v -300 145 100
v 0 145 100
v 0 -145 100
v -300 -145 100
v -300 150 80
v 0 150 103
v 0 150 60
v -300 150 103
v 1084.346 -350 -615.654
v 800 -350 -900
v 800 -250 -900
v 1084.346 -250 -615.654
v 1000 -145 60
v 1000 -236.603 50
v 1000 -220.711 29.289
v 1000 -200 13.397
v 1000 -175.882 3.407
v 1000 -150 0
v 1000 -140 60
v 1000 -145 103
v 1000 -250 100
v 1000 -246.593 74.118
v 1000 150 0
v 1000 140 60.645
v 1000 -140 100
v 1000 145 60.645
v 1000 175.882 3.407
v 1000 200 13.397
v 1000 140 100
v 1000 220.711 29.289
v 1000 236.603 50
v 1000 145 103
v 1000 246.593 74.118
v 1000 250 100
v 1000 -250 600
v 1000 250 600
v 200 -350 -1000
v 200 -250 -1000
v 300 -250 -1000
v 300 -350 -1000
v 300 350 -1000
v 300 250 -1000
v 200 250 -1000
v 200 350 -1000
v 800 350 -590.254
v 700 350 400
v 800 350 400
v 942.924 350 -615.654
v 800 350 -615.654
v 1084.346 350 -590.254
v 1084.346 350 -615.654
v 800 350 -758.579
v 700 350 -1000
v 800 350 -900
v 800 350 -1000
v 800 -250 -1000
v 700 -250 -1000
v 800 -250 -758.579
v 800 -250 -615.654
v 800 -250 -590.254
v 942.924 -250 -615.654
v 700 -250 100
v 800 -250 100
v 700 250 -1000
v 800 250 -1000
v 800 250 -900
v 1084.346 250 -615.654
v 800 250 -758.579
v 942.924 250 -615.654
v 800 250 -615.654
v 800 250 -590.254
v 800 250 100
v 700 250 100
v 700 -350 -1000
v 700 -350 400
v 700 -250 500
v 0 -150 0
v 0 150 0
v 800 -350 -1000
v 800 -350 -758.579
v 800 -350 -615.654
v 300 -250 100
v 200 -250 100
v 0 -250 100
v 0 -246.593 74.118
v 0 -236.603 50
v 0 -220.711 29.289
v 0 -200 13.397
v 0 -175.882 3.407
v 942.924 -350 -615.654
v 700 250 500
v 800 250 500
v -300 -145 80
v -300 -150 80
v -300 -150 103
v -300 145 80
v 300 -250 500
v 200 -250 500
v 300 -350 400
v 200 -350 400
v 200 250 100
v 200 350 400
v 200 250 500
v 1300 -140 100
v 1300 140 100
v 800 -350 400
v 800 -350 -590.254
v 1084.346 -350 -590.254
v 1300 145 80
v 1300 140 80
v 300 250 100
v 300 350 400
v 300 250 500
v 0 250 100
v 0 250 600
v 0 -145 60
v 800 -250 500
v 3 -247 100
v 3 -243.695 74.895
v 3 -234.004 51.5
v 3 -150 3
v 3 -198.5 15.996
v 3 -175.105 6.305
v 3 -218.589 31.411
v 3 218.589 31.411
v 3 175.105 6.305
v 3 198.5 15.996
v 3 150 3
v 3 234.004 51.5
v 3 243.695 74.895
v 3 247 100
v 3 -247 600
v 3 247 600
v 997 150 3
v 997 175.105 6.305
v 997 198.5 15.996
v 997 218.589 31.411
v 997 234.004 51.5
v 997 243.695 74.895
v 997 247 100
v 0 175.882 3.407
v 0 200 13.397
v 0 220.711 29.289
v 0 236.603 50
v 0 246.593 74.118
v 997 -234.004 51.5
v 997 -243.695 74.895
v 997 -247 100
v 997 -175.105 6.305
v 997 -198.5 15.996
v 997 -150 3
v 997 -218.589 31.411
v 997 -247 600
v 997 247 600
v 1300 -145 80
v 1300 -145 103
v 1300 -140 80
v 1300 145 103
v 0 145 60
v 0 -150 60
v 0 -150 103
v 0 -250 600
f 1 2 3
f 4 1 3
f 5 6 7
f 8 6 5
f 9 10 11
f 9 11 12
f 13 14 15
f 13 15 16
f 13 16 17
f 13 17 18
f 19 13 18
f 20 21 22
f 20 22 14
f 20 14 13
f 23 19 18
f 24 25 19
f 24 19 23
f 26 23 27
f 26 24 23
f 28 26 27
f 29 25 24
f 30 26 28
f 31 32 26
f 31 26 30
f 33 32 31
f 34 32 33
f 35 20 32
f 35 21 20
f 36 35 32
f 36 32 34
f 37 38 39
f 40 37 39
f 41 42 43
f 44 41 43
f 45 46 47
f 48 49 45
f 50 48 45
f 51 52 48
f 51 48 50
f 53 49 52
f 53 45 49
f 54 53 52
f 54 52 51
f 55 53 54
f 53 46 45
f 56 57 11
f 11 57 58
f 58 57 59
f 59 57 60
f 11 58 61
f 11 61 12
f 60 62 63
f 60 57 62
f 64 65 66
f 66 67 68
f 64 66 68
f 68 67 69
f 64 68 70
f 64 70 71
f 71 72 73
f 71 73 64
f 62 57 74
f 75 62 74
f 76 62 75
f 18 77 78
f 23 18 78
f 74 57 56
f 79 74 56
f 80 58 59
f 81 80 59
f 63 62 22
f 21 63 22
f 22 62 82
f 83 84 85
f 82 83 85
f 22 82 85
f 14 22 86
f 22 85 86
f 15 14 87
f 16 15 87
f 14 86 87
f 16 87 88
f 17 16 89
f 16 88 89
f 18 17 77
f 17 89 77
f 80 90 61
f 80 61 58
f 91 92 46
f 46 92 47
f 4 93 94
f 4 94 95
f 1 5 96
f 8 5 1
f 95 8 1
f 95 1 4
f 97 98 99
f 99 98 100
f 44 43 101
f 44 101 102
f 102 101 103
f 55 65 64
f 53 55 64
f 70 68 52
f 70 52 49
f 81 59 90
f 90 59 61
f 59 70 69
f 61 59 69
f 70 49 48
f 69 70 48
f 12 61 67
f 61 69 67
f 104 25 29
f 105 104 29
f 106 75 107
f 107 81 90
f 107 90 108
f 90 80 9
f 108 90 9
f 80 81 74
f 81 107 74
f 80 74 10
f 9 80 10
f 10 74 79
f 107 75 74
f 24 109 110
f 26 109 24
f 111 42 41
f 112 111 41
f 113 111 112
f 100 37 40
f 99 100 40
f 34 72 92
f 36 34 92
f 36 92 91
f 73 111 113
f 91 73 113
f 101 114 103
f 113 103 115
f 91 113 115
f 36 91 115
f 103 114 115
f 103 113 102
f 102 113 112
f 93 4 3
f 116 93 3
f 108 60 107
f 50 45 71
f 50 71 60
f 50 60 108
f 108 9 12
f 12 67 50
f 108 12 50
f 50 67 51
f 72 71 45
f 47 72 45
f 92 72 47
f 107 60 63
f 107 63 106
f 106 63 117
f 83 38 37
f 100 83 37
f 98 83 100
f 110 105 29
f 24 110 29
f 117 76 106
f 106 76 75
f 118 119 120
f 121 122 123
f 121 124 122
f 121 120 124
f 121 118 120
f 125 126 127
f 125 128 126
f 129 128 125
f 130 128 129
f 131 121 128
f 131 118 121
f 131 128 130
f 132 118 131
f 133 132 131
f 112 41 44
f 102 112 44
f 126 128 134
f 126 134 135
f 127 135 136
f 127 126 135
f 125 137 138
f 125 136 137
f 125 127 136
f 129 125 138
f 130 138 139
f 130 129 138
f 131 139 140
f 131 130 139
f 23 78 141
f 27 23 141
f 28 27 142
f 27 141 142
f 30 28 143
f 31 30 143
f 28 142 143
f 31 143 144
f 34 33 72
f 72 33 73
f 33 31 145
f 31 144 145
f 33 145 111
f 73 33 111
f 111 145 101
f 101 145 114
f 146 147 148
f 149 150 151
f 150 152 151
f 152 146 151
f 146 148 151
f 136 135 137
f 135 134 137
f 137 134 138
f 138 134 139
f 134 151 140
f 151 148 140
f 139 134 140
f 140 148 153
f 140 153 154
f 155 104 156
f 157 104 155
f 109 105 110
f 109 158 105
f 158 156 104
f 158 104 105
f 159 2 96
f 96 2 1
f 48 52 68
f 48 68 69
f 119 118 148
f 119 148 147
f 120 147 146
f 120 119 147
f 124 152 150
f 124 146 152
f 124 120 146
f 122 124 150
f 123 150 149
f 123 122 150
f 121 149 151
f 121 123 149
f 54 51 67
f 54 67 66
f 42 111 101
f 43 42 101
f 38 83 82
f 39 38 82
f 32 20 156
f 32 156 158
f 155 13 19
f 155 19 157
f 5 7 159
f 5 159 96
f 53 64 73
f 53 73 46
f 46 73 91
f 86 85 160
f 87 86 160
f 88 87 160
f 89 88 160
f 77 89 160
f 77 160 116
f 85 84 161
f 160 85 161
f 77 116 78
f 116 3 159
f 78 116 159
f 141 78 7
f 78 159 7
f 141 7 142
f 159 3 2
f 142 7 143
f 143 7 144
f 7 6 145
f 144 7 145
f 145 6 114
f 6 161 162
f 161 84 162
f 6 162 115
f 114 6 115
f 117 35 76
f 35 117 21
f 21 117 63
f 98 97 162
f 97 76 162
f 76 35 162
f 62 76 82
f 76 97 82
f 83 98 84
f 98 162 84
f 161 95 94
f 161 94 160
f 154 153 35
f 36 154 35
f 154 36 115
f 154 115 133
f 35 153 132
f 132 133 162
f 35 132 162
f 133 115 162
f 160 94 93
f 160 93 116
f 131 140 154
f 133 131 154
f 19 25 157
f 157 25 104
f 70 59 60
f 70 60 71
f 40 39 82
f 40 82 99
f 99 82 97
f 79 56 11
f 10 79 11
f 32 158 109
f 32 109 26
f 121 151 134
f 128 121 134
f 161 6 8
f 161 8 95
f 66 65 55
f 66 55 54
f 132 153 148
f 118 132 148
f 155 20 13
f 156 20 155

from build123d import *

# Parameters (mm, degrees)
F1_DEPTH  = 1000
F2_T      = -3
F3_W      = 300
F3_H      = 3
F4_DEPTH  = 300
F6_DEPTH  = 5
F8_DEPTH  = 5
F9_W      = 100
F9_H      = 1500
F10_DEPTH = 100
F12_DEPTH = 800.001
F13_W     = 100
F13_H     = 1500
F14_DEPTH = 100
F16_DEPTH = 1100.001
F17_W     = 290
F17_H     = 3
F18_DEPTH = 300
F20_DEPTH = 5
F22_DEPTH = 5
F24_DEPTH = 100
F26_DEPTH = 100
F28_DEPTH = 744.22
F29_W     = 284.3456985965
F29_H     = 700
F30_DEPTH = 25.4


with BuildPart() as f1:
    # F0 (on Right) → F1 (new body)
    with BuildSketch(Plane.YZ):
        with BuildLine():
            Line((250, 100), (250, 600))
            Line((250, 600), (-250, 600))
            Line((-250, 600), (-250, 100))
            ThreePointArc((-250, 100), (-220.7106781187, 29.2893218813), (-150, 0))
            Line((-150, 0), (150, 0))
            ThreePointArc((150, 0), (220.7106781187, 29.2893218813), (250, 100))
        make_face()
    extrude(amount=F1_DEPTH)

    # F2
    f2_openings = [f1.faces().sort_by_distance(p)[0] for p in [
        (500, 0, 600),
    ]]
    offset(amount=F2_T, openings=f2_openings)

    # F3 (on face) → F4 (join)
    with BuildSketch(Plane(origin=(0, 0, 0), x_dir=(0, -1, 0), z_dir=(-1, 0, 0))):
        with Locations((0, 101.5)):
            Rectangle(F3_W, F3_H)
    extrude(amount=F4_DEPTH)

    # F5 (on face) → F6 (join)
    with BuildSketch(Plane.XZ.offset(150)):
        Polygon((0, 100), (-300, 100), (-300, 80), (0, 60), align=None)
    extrude(amount=-F6_DEPTH)

    # F7 (on face) → F8 (join)
    with BuildSketch(Plane(origin=(0, 150, 0), x_dir=(-1, 0, 0), z_dir=(0, 1, 0))):
        Polygon((300, 100), (0, 100), (0, 60), (300, 80), align=None)
    extrude(amount=-F8_DEPTH)

    # F9 (on face) → F10 (join)
    with BuildSketch(Plane.XZ.offset(250)):
        with Locations((250, -250)):
            Rectangle(F9_W, F9_H)
        with Locations((750, -250)):
            Rectangle(F9_W, F9_H)
    extrude(amount=F10_DEPTH)

    # F11 (on face) → F12 (cut, through all)
    with BuildSketch(Plane(origin=(200, 0, 0), x_dir=(0, -1, 0), z_dir=(-1, 0, 0))):
        Polygon((350, 500), (250, 500), (350, 400), align=None)
    extrude(amount=-F12_DEPTH, mode=Mode.SUBTRACT)

    # F13 (on face) → F14 (join)
    with BuildSketch(Plane(origin=(0, 250, 0), x_dir=(-1, 0, 0), z_dir=(0, 1, 0))):
        with Locations((-750, -250)):
            Rectangle(F13_W, F13_H)
        with Locations((-250, -250)):
            Rectangle(F13_W, F13_H)
    extrude(amount=F14_DEPTH)

    # F15 (on face) → F16 (cut, through all)
    with BuildSketch(Plane.YZ.offset(800)):
        Polygon((350, 500), (250, 500), (350, 400), align=None)
    extrude(amount=-F16_DEPTH, mode=Mode.SUBTRACT)

    # F17 (on face) → F18 (join)
    with BuildSketch(Plane.YZ.offset(1000)):
        with Locations((0, 101.5)):
            Rectangle(F17_W, F17_H)
    extrude(amount=F18_DEPTH)

    # F19 (on face) → F20 (join)
    with BuildSketch(Plane.XZ.offset(145)):
        Polygon((1300, 100), (1000, 100), (1000, 60), (1300, 80), align=None)
    extrude(amount=-F20_DEPTH)

    # F21 (on face) → F22 (join)
    with BuildSketch(Plane(origin=(0, 145, 0), x_dir=(-1, 0, 0), z_dir=(0, 1, 0))):
        Polygon((-1000, 100), (-1300, 100), (-1300, 80), (-1000, 60.6447160244), align=None)
    extrude(amount=-F22_DEPTH)

    # F23 (on face) → F24 (join, through all)
    with BuildSketch(Plane.XZ.offset(350)):
        Polygon((800, -758.5786437627), (800, -900), (1084.3456985965, -615.6543014035), (1013.6350204779, -544.9436232848), align=None)
    extrude(amount=-F24_DEPTH)

    # F25 (on face) → F26 (join)
    with BuildSketch(Plane(origin=(0, 350, 0), x_dir=(-1, 0, 0), z_dir=(0, 1, 0))):
        Polygon((-1084.3456985965, -615.6543014035), (-800, -900), (-800, -758.5786437627), (-1013.6350204779, -544.9436232848), align=None)
    extrude(amount=-F26_DEPTH)

    # F27 (on face) → F28 (cut)
    with BuildSketch(Plane.XZ.offset(350)):
        Polygon((942.9243423592, -615.6543014035), (1084.3456985965, -615.6543014035), (1013.6350204779, -544.9436232848), align=None)
    extrude(amount=-F28_DEPTH, mode=Mode.SUBTRACT)

    # F29 (on face) → F30 (join)
    with BuildSketch(Plane.XY.offset(-615.6543014035)):
        with Locations((942.1728492983, 0)):
            Rectangle(F29_W, F29_H)
    extrude(amount=F30_DEPTH)


solid = f1.part
